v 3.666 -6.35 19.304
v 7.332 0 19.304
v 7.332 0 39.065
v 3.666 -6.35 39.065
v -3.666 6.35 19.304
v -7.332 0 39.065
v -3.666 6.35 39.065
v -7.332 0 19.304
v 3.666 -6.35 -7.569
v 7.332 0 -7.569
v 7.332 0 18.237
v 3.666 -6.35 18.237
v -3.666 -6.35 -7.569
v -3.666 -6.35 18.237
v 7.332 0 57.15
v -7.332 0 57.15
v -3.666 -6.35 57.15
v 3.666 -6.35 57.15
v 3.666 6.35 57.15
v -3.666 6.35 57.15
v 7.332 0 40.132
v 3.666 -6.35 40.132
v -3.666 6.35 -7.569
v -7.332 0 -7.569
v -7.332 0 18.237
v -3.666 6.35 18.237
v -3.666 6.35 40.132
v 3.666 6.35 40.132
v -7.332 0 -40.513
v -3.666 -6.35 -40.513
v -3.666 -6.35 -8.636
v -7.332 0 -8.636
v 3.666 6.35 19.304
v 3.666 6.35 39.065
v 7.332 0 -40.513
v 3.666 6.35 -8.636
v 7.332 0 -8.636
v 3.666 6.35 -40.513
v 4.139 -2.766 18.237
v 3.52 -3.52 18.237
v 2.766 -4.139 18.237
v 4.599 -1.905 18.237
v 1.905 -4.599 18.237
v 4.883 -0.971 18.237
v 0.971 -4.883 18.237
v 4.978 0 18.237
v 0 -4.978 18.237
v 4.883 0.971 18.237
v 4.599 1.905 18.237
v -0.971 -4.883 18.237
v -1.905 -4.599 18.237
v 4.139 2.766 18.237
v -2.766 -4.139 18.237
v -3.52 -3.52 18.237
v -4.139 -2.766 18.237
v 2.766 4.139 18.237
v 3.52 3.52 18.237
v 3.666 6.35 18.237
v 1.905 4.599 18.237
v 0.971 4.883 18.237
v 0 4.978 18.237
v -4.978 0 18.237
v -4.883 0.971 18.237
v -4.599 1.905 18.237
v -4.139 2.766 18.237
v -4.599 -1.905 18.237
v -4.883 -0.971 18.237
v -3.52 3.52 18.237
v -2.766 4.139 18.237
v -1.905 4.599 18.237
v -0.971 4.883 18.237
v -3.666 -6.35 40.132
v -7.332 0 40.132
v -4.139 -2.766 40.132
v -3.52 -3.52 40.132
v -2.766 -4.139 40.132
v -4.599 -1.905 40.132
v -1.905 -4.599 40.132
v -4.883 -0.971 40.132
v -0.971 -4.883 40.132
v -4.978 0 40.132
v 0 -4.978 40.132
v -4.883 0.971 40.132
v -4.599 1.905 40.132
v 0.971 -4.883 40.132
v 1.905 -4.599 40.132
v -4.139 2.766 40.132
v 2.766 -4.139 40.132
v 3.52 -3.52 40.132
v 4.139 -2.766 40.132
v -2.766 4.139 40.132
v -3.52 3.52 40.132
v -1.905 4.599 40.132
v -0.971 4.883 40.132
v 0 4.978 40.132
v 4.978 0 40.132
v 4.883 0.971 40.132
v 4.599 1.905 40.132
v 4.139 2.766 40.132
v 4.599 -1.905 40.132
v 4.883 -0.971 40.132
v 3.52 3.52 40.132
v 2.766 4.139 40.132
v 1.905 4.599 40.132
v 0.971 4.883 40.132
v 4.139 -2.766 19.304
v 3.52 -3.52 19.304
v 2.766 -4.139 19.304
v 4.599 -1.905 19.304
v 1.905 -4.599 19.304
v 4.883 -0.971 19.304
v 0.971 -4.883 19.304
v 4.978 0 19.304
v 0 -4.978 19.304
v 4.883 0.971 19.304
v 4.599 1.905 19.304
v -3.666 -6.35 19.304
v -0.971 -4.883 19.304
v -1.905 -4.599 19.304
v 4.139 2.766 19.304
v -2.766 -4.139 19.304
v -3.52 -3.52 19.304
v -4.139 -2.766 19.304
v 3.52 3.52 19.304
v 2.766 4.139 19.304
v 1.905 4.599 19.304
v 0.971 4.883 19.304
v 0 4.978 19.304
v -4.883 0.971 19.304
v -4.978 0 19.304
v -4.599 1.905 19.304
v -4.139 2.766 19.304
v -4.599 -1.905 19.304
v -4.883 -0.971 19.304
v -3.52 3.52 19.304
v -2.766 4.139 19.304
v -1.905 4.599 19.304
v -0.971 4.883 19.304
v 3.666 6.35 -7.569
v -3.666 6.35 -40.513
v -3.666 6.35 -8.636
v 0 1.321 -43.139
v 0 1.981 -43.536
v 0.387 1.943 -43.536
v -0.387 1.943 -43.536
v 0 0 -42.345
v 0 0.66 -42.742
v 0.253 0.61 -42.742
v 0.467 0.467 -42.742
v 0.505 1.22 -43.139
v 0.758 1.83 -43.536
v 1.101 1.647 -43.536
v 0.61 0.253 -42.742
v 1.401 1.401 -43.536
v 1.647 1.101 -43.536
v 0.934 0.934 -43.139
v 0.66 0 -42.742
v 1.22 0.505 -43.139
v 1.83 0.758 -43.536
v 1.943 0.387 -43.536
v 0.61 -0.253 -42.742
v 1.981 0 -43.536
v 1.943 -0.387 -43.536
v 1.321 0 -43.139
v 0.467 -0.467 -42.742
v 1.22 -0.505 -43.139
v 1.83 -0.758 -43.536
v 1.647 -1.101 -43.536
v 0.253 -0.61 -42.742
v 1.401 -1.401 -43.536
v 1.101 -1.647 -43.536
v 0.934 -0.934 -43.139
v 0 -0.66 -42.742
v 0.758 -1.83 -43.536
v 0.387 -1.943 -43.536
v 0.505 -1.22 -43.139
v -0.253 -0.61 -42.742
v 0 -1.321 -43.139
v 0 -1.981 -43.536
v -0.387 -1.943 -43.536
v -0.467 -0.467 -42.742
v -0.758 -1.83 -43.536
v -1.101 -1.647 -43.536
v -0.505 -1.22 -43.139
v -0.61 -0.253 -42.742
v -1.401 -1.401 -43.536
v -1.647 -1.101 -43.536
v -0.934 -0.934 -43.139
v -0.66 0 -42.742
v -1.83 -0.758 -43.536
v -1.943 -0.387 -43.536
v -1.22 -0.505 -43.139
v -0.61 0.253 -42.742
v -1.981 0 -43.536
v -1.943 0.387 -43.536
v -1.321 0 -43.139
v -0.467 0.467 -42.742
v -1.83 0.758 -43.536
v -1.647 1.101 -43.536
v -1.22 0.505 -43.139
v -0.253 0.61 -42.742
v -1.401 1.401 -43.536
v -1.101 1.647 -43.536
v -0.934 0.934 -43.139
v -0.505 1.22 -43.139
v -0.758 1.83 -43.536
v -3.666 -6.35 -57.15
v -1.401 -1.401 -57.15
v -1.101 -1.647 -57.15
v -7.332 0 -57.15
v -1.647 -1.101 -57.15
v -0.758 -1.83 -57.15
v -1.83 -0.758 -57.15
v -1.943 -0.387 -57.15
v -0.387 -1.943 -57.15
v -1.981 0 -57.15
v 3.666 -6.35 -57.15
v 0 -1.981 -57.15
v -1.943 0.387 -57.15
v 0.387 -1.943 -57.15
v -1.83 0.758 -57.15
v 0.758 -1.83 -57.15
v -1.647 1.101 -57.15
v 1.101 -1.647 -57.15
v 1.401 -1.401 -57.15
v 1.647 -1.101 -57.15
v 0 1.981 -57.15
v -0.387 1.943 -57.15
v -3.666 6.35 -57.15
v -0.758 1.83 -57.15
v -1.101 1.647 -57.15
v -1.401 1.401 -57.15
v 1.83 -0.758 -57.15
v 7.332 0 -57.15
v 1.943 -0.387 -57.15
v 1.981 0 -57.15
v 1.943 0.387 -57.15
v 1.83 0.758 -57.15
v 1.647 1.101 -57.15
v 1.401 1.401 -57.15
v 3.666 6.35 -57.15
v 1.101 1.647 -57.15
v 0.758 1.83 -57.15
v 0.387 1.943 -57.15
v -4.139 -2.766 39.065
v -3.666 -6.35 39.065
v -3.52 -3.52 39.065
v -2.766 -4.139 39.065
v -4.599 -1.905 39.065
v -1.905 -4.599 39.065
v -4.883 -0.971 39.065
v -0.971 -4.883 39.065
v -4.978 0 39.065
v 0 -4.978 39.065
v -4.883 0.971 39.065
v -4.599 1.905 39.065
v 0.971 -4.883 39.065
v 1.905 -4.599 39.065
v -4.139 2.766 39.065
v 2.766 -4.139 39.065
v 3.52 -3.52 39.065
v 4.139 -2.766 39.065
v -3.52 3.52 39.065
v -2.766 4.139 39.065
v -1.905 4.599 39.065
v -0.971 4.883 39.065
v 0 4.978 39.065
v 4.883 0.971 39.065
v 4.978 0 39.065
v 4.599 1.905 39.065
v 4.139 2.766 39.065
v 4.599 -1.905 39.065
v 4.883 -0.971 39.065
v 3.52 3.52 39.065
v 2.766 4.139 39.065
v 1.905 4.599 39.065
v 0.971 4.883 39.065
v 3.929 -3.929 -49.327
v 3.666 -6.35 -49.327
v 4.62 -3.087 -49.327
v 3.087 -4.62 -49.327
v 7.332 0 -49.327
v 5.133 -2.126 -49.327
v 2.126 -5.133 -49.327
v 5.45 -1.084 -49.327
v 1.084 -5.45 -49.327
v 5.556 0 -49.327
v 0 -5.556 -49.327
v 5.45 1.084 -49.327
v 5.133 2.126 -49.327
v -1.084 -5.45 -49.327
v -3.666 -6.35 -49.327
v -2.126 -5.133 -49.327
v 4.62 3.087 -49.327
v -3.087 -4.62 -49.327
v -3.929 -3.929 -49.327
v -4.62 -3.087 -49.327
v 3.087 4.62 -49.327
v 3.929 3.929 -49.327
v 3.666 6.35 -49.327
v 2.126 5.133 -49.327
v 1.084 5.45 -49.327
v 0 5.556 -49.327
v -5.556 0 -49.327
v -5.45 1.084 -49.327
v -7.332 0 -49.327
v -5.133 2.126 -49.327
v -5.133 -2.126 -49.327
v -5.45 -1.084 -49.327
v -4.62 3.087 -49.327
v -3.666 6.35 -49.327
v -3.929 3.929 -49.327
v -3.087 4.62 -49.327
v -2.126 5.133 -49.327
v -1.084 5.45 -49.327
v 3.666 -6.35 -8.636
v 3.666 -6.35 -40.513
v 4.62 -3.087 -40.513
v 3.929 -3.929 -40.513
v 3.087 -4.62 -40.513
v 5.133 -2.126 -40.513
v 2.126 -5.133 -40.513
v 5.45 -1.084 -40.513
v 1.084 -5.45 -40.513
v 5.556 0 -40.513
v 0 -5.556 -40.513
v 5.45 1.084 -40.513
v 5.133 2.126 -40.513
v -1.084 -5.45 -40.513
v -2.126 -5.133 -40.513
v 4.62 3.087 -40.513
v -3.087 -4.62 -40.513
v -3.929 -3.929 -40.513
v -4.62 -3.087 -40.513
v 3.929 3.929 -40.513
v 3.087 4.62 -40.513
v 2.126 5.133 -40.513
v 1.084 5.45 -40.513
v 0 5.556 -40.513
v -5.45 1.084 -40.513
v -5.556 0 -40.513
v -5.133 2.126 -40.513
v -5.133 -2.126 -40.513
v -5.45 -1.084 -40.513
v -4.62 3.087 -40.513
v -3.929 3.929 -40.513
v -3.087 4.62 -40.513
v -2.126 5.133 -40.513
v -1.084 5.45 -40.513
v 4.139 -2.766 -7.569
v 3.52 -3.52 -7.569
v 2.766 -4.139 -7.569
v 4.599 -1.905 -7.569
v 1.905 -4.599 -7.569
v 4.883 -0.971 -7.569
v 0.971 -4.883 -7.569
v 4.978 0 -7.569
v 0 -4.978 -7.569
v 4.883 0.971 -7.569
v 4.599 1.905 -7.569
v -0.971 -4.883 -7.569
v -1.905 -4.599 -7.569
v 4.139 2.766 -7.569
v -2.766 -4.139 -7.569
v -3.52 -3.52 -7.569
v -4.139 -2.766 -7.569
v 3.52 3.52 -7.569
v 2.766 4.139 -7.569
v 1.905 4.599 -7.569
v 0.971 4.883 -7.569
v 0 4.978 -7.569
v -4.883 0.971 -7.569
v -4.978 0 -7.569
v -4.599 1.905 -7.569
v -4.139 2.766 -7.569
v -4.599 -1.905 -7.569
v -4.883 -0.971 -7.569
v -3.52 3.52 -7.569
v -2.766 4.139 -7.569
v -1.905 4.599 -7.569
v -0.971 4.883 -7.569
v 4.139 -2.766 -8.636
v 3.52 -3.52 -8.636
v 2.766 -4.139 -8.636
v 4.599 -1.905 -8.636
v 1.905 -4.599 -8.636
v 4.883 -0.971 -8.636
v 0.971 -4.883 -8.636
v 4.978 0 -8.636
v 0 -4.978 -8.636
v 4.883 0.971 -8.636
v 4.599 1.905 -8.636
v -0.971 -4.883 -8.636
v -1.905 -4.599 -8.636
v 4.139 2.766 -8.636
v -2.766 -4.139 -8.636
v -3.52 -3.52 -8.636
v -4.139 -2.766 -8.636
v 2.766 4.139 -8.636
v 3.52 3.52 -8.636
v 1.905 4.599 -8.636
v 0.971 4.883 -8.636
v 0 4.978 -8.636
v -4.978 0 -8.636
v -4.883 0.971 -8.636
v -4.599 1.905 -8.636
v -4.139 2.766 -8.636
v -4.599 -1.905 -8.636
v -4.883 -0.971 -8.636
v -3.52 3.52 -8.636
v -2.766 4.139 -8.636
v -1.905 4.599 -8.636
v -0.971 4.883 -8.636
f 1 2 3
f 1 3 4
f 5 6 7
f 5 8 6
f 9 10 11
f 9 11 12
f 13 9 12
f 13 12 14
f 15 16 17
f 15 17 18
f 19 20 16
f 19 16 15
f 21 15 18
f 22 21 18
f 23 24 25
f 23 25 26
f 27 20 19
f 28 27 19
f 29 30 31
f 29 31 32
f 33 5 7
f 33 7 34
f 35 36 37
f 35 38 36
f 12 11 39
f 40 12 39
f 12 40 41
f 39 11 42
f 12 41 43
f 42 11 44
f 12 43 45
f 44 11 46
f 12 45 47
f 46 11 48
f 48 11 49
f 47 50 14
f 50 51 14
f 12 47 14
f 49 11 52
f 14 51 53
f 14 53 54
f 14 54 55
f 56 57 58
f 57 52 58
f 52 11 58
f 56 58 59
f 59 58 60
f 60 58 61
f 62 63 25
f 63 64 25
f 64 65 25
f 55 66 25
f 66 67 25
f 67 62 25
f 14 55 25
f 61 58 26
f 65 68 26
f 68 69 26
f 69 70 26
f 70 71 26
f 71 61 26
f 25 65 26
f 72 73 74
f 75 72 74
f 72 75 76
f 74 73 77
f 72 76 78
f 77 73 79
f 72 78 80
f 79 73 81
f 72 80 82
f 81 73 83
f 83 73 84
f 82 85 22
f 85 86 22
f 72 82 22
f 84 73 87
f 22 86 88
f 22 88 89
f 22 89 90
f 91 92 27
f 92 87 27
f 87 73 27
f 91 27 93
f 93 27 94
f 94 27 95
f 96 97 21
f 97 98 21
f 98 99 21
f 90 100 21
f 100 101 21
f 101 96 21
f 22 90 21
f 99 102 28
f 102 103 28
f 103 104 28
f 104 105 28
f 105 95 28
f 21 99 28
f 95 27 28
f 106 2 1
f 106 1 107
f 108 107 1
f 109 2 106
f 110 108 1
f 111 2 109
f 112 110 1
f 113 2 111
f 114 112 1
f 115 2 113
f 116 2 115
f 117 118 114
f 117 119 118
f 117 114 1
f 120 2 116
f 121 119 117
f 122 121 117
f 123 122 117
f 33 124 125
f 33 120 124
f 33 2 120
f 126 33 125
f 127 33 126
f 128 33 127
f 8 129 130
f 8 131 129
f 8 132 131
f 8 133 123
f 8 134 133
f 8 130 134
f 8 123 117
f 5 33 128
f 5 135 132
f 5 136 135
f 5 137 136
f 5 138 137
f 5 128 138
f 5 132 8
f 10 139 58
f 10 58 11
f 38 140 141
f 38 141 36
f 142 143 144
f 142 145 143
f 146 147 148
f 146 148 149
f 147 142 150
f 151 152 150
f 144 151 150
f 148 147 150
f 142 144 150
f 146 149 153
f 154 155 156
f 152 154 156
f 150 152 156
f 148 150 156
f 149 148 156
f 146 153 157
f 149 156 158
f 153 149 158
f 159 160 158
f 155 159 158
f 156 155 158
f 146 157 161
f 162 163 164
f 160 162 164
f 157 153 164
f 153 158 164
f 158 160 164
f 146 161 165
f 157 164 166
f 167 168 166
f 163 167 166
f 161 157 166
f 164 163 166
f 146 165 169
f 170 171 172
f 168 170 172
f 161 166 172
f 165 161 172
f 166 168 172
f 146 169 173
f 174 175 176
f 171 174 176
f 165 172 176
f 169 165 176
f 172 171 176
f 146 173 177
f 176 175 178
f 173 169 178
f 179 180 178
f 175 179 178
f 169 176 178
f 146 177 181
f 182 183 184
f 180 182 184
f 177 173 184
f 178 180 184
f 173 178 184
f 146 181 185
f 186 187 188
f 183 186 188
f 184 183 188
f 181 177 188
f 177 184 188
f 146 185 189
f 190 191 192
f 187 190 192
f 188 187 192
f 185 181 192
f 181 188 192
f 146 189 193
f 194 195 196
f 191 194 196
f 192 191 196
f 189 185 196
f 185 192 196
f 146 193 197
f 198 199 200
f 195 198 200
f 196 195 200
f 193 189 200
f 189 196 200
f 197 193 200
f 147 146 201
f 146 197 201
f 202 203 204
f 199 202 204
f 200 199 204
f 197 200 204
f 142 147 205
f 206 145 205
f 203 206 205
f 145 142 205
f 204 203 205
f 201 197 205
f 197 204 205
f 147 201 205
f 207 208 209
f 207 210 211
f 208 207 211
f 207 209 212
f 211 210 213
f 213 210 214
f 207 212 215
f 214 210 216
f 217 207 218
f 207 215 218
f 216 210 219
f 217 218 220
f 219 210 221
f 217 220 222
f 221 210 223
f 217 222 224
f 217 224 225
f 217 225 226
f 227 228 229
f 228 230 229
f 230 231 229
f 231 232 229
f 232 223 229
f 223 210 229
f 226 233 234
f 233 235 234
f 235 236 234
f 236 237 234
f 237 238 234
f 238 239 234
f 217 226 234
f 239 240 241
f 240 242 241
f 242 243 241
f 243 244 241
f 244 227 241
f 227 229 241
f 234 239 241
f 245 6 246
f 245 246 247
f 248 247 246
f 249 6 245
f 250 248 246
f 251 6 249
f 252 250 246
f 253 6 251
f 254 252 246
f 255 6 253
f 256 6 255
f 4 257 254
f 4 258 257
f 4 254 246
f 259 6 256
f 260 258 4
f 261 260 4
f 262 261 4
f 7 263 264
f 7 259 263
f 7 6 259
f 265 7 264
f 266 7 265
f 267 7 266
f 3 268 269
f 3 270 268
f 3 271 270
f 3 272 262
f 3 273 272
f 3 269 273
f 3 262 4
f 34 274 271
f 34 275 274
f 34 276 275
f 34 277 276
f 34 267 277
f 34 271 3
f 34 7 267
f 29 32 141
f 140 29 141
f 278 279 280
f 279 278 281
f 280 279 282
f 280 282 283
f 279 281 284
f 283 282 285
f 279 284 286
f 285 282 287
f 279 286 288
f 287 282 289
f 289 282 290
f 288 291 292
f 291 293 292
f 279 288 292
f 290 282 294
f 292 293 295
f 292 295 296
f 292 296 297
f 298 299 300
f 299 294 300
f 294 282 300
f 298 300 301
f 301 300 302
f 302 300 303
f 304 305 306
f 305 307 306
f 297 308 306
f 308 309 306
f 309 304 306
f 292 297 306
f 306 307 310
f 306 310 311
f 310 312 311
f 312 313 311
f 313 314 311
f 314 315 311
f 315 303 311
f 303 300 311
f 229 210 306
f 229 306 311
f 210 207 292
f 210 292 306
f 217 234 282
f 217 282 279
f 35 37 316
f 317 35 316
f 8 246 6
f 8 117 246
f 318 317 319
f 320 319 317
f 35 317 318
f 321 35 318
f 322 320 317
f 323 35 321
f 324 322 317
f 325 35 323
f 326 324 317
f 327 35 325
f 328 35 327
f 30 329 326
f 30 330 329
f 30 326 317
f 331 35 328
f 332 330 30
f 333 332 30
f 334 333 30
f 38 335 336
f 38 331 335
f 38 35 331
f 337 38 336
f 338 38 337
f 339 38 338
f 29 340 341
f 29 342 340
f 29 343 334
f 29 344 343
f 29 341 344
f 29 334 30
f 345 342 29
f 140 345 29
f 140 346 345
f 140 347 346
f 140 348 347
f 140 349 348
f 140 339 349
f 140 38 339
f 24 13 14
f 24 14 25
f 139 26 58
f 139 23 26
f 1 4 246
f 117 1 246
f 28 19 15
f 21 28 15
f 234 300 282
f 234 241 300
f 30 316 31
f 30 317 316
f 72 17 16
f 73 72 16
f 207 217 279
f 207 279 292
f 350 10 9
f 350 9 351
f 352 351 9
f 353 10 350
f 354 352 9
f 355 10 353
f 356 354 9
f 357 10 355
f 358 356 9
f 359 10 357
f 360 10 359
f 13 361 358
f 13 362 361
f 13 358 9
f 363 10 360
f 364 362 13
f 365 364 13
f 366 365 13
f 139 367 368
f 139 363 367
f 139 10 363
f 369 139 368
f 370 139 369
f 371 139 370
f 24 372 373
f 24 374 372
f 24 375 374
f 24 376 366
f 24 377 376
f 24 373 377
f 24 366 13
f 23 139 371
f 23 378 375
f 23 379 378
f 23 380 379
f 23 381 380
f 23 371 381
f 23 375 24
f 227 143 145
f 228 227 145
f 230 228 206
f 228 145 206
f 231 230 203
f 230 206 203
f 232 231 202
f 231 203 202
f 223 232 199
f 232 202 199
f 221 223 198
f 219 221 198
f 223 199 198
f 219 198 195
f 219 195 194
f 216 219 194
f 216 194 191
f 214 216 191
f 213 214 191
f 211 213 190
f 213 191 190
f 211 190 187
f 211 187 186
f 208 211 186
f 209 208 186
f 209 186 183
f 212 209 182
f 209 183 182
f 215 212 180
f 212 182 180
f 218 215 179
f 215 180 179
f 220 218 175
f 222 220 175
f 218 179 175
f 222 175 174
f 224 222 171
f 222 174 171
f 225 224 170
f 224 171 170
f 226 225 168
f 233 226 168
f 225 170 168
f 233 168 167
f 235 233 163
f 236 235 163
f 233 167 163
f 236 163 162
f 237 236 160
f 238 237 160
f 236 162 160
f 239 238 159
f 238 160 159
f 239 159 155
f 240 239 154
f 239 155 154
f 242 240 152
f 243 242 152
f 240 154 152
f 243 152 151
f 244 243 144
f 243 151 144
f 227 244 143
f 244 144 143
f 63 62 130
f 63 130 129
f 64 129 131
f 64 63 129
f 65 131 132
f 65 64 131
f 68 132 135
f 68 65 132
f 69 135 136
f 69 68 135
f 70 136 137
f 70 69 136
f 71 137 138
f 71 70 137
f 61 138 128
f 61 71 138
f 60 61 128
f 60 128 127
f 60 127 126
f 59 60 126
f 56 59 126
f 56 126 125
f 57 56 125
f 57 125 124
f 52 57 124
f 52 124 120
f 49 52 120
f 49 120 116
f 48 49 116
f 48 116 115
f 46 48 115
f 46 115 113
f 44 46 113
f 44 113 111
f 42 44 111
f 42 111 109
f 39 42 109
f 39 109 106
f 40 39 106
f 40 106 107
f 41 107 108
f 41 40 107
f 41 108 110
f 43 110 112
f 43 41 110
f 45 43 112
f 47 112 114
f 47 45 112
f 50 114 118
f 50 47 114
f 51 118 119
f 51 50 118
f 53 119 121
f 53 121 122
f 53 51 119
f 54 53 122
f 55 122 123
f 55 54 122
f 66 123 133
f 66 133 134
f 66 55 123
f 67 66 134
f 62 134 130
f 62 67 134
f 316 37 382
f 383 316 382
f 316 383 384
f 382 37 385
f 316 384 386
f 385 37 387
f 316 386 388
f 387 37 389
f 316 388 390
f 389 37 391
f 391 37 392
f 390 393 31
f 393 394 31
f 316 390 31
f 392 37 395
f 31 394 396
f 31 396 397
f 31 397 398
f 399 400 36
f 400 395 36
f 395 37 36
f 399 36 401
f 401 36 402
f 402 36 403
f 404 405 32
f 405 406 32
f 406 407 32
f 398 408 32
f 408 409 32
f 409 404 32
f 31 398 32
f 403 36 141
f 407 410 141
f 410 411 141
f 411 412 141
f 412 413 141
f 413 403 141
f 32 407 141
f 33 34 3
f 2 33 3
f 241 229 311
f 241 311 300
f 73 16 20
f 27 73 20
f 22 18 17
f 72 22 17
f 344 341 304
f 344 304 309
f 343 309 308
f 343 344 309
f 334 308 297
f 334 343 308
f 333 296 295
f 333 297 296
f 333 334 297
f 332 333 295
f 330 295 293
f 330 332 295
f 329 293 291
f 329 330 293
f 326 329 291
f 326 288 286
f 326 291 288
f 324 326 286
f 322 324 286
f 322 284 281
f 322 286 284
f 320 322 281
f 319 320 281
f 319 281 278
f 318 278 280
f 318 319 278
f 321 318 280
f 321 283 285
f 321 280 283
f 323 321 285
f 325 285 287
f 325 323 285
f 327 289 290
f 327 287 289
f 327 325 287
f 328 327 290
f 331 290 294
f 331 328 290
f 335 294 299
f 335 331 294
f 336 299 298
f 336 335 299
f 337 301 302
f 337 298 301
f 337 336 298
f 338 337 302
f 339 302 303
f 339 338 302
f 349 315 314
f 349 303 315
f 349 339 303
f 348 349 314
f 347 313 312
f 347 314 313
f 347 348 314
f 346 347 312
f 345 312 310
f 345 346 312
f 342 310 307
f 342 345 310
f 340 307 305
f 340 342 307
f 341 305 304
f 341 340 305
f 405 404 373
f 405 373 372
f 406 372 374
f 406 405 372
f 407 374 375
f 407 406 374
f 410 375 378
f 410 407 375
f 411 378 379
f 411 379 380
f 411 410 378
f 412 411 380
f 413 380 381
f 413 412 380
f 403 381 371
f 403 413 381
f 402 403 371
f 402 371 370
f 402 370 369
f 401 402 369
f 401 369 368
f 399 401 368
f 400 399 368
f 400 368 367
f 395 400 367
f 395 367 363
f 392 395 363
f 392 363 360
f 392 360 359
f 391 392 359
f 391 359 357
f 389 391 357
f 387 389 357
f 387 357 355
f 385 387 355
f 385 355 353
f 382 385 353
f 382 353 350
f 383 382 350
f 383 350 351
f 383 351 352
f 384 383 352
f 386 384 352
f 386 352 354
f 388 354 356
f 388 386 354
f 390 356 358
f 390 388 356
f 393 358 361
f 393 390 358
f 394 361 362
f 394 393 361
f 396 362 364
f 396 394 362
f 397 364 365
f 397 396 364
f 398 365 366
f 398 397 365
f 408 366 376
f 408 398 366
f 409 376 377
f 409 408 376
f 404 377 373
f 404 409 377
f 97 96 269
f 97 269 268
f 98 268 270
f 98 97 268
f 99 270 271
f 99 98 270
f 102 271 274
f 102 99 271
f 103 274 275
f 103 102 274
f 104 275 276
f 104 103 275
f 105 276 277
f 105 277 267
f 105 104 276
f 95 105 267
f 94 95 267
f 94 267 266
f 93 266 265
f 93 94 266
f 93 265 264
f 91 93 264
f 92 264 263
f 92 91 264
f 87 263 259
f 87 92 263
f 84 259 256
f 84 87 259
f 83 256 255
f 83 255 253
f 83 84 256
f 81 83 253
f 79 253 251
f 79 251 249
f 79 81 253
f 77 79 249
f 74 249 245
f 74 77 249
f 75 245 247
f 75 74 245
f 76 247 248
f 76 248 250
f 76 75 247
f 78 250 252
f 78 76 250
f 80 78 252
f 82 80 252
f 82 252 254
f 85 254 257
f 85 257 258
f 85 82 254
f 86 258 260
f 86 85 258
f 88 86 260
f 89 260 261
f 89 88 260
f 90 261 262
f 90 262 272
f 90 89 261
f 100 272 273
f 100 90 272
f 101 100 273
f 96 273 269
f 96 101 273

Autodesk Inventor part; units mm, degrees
ref_plane "YZ Plane" through (0, 0, 0) normal (1, 0, 0) x (0, 1, 0)
ref_plane "XZ Plane" through (0, 0, 0) normal (0, 1, 0) x (-1, 0, 0)
ref_plane "XY Plane" through (0, 0, 0) normal (0, 0, 1) x (1, 0, 0)
sketch "Sketch1" plane through (0, 0, 0) normal (0, 0, 1) x (1, 0, 0)
  line L0 (7.3323, 0) -> (3.6662, -6.35)
  line L1 (3.6662, -6.35) -> (-3.6662, -6.35)
  line L2 (-3.6662, -6.35) -> (-7.3323, 0)
  line L3 (-7.3323, 0) -> (-3.6662, 6.35)
  line L4 (-3.6662, 6.35) -> (3.6662, 6.35)
  line L5 (3.6662, 6.35) -> (7.3323, 0)
  point P0 (0, 0)
  point P1 (0, 0)
  dimension "d0" = 12.7
extrude "Extrusion1" add sketch "Sketch1" along normal mid plane 114.3
sketch "Sketch10" plane through (0, 0, -57.15) normal (0, 0, -1) x (-1, 0, 0)
  point P0 (0, 0)
  point P1 (0, 0)
hole "Hole3" at (0, 0, -57.15) direction (0, 0, 1) diameter 3.9624 depth 13.6144 tip angle 118 thread size "10-32 UNF" class "2B" standard "ANSI Unified Screw Threads"
ref_plane "Work Plane4" through (0, 0, -46.99) normal (0, 0, -1) x (-1, 0, 0)
ref_plane "Work Plane5" through (0, 0, -8.636) normal (0, 0, -1) x (-1, 0, 0)
ref_plane "Work Plane6" through (0, 0, 18.2372) normal (0, 0, -1) x (-1, 0, 0)
sketch "Sketch13" plane through (0, 0, 18.2372) normal (0, 0, -1) x (-1, 0, 0)
  circle A0 centre (0, 0) radius 1.9812
  circle A1 centre (0, 0) radius 4.9784
  line L0 (3.6662, -6.35) -> (7.3323, 0)
  circle A2 centre (0, 0) radius 7.3323
  dimension "d51" = 9.9568
extrude "Extrusion7" cut sketch "Sketch13" against normal blind 1.0668 contours A2 L0 | L0 A2
ref_plane "Work Plane7" through (0, 0, 40.132) normal (0, 0, 1) x (1, 0, 0)
sketch "Sketch15" plane through (0, 0, 40.132) normal (0, 0, 1) x (1, 0, 0)
  circle A0 centre (0, 0) radius 1.9812
  circle A1 centre (0, 0) radius 4.9784
  line L0 (3.6662, -6.35) -> (7.3323, 0)
  circle A2 centre (0, 0) radius 7.3323
  dimension "d60" = 9.9568
extrude "Extrusion9" cut sketch "Sketch15" against normal blind 1.0668 contours A2 L0 | L0 A2
sketch "Sketch16" plane through (0, 0, 39.0652) normal (0, 0, 1) x (1, 0, 0)
  point P0 (0, 0)
sketch "Sketch17" plane through (0, 0, -46.99) normal (0, 0, -1) x (-1, 0, 0)
  circle A0 centre (0, 0) radius 1.9812 projected
  circle A1 centre (0, 0) radius 5.5563
  line L0 (-3.6662, 6.35) -> (3.6662, 6.35) projected
  line L1 (3.6662, 6.35) -> (7.3323, 0) projected
  line L2 (7.3323, 0) -> (3.6662, -6.35) projected
  line L3 (3.6662, -6.35) -> (-3.6662, -6.35) projected
  line L4 (-3.6662, -6.35) -> (-7.3323, 0) projected
  line L5 (-7.3323, 0) -> (-3.6662, 6.35) projected
  dimension "d64" = 11.1125
extrude "Extrusion10" cut sketch "Sketch17" along normal blind 2.3368 and the other way blind 6.477 contours L0 L1 L2 L3 L4 L5
sketch "Sketch18" plane through (0, 0, -8.636) normal (0, 0, -1) x (-1, 0, 0)
  circle A0 centre (0, 0) radius 1.9812
  circle A1 centre (0, 0) radius 4.9784
  line L0 (3.6662, -6.35) -> (7.3323, 0)
  circle A2 centre (0, 0) radius 7.3323
  dimension "d69" = 9.9568
extrude "Extrusion11" cut sketch "Sketch18" against normal blind 1.0668 contours A2 L0 | L0 A2
properties part number "Ch-1-01-0.5x4.5HexShaft" material "Steel, Alloy"
